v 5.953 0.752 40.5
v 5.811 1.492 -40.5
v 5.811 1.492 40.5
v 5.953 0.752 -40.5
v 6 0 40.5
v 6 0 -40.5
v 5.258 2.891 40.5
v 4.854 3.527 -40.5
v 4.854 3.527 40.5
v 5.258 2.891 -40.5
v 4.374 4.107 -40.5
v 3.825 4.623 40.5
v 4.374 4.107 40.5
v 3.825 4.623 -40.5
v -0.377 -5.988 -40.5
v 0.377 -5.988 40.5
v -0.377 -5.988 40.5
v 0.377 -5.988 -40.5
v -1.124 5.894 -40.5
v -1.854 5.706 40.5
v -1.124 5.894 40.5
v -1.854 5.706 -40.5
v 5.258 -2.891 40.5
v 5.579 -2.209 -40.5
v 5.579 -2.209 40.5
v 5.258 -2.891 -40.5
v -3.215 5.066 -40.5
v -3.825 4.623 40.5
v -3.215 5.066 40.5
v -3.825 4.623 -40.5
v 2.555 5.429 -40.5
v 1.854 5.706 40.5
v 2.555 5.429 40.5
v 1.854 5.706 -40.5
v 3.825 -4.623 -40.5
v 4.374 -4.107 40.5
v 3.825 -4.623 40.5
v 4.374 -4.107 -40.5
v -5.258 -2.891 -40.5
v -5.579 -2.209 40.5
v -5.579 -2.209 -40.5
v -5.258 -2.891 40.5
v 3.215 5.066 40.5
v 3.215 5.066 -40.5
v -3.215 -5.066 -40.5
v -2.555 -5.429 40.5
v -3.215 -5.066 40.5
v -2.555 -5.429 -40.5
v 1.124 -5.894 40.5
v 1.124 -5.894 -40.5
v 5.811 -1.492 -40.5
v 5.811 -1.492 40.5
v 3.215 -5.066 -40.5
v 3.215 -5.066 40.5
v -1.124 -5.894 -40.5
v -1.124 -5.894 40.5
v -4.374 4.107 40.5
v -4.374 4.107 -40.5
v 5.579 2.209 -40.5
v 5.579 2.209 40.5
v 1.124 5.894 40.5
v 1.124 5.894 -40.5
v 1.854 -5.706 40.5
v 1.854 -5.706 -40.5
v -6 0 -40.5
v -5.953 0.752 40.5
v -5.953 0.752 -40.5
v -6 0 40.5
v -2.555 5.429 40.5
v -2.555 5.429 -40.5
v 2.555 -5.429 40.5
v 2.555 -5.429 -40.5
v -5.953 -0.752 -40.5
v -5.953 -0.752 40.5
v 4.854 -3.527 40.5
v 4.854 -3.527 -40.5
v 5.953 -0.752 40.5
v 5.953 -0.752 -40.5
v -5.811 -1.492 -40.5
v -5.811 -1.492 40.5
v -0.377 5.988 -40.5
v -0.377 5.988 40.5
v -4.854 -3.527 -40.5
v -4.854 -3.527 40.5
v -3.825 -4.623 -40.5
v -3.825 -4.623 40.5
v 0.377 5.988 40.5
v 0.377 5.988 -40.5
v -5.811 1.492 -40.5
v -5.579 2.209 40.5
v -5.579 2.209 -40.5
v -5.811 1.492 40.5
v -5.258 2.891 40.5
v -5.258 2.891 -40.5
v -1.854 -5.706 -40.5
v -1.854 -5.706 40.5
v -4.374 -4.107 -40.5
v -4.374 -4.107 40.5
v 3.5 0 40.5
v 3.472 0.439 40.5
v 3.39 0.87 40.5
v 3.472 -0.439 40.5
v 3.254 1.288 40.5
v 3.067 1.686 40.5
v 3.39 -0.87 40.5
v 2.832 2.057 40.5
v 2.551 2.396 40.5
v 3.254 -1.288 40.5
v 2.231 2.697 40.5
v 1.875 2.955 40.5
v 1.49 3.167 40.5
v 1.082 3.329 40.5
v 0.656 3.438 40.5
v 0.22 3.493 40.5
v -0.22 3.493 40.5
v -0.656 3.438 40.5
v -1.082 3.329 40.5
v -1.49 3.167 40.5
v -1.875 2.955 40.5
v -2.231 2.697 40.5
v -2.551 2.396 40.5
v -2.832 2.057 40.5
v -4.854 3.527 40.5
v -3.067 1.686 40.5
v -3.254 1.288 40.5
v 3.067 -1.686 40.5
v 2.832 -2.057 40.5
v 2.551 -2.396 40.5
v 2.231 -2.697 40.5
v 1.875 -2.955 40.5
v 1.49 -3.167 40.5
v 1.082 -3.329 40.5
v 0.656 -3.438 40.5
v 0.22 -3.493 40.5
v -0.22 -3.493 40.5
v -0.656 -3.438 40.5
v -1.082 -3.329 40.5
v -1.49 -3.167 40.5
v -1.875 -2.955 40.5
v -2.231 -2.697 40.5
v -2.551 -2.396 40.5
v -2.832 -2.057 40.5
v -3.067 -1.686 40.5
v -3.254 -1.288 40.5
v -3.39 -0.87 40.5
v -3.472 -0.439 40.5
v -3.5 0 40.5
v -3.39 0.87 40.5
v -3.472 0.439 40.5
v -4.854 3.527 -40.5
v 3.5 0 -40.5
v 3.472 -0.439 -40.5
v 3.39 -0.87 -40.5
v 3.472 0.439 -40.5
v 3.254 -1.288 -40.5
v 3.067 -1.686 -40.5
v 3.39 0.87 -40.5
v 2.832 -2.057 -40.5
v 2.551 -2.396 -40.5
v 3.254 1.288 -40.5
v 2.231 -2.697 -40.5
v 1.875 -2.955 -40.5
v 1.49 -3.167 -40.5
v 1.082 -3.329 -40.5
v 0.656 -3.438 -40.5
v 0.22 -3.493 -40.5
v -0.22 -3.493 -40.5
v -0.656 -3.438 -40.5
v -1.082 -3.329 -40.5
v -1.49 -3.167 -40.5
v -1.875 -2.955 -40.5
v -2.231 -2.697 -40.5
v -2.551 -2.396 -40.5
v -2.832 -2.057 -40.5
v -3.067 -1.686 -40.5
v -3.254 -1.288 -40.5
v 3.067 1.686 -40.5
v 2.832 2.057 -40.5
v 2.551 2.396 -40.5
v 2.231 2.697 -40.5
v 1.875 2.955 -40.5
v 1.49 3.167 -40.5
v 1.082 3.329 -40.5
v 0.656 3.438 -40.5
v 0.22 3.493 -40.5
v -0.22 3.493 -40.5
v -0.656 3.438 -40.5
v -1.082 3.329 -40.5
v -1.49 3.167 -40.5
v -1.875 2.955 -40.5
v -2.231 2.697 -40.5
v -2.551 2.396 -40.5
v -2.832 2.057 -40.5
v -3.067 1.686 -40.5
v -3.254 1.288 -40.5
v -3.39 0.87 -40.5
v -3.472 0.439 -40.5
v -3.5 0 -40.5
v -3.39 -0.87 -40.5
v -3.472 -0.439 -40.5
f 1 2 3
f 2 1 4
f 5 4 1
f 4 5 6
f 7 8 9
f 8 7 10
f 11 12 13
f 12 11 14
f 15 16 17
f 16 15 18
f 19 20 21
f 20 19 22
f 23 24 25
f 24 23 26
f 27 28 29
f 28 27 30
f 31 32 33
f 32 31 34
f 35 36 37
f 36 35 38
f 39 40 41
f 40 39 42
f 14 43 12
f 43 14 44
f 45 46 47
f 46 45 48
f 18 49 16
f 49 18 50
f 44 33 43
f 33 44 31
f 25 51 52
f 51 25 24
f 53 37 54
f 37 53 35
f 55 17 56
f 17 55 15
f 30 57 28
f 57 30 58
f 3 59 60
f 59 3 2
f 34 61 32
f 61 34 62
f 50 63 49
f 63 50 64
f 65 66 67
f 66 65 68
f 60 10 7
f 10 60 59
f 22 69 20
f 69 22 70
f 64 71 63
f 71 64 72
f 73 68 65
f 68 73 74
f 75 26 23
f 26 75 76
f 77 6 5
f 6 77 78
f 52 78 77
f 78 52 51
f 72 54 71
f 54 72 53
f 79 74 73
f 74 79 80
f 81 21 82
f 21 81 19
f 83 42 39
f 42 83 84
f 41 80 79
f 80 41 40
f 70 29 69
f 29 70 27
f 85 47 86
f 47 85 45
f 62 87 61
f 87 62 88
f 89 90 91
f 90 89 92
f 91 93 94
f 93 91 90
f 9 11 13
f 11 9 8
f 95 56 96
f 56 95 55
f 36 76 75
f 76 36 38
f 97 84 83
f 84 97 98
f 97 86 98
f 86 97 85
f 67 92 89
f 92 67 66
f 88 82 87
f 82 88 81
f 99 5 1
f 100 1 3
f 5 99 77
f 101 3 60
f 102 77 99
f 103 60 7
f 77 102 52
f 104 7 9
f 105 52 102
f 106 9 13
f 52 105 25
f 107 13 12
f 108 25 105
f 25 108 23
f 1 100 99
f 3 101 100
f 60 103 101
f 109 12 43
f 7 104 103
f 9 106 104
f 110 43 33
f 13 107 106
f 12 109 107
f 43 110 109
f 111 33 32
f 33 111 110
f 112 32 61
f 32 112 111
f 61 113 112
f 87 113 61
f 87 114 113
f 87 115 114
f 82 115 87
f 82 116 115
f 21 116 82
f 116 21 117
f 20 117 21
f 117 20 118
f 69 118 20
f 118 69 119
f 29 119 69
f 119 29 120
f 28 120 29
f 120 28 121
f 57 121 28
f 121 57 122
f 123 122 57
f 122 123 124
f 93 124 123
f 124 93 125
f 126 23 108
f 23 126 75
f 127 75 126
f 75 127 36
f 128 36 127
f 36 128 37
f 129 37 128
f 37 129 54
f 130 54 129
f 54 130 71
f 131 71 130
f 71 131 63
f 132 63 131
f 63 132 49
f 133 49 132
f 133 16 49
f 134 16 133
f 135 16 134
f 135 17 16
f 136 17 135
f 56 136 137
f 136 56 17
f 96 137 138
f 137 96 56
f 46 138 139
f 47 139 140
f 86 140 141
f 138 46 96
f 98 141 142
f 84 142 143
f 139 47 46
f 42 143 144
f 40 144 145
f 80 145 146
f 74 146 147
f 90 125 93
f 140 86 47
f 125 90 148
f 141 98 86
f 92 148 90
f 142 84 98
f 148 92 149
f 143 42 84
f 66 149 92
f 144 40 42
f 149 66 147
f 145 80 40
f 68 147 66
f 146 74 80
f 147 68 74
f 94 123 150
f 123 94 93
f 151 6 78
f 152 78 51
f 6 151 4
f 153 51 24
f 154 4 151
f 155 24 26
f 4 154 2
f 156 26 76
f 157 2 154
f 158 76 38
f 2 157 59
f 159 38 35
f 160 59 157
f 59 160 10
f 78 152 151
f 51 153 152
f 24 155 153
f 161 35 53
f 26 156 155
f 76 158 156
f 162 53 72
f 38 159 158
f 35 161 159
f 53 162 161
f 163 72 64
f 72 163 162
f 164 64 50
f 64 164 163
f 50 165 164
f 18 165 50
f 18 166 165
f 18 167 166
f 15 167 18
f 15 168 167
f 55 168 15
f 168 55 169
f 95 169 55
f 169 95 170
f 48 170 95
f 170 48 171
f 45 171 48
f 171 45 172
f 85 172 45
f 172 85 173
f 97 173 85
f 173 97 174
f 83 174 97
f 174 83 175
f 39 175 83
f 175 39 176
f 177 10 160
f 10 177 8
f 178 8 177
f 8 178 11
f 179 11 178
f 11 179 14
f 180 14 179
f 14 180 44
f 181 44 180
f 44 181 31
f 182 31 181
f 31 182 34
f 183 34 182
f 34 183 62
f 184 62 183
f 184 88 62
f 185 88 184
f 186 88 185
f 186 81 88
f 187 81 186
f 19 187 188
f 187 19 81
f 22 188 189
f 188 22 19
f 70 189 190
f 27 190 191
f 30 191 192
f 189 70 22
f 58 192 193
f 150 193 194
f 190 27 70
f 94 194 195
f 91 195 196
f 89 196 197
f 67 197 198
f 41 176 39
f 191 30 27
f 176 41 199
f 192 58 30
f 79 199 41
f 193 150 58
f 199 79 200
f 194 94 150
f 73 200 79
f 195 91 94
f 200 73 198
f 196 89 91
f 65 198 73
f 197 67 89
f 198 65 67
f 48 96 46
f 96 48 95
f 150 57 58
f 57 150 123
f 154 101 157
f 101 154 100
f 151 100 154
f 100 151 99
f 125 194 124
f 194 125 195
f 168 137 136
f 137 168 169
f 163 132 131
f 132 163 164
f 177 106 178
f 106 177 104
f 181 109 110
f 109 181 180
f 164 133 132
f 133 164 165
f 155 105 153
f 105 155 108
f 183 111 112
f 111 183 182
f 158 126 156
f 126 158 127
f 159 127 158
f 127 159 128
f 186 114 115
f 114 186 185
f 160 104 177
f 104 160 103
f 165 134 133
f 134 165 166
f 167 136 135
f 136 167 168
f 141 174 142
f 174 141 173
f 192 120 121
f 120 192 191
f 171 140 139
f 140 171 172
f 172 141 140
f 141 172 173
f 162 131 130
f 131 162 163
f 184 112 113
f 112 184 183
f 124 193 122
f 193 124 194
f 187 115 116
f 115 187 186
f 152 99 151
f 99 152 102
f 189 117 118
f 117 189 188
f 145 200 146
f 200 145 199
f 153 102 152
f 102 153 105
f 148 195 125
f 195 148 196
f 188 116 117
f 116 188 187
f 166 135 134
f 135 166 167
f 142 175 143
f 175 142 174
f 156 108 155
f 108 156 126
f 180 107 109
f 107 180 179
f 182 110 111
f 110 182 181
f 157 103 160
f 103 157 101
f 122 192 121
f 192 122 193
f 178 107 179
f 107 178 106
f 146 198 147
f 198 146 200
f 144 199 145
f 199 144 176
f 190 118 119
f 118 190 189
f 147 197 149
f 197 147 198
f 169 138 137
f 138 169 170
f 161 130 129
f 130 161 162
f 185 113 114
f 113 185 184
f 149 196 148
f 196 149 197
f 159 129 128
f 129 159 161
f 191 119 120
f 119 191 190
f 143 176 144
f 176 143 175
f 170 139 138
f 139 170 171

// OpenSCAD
$fn = 50;


difference() {
	union() {
		translate(v = [0, 0, -40.5000000000]) {
			cylinder(h = 81, r = 6.0000000000);
		}
	}
	union() {
		translate(v = [0, 0, -100.0000000000]) {
			cylinder(h = 200, r = 3.5000000000);
		}
	}
}
